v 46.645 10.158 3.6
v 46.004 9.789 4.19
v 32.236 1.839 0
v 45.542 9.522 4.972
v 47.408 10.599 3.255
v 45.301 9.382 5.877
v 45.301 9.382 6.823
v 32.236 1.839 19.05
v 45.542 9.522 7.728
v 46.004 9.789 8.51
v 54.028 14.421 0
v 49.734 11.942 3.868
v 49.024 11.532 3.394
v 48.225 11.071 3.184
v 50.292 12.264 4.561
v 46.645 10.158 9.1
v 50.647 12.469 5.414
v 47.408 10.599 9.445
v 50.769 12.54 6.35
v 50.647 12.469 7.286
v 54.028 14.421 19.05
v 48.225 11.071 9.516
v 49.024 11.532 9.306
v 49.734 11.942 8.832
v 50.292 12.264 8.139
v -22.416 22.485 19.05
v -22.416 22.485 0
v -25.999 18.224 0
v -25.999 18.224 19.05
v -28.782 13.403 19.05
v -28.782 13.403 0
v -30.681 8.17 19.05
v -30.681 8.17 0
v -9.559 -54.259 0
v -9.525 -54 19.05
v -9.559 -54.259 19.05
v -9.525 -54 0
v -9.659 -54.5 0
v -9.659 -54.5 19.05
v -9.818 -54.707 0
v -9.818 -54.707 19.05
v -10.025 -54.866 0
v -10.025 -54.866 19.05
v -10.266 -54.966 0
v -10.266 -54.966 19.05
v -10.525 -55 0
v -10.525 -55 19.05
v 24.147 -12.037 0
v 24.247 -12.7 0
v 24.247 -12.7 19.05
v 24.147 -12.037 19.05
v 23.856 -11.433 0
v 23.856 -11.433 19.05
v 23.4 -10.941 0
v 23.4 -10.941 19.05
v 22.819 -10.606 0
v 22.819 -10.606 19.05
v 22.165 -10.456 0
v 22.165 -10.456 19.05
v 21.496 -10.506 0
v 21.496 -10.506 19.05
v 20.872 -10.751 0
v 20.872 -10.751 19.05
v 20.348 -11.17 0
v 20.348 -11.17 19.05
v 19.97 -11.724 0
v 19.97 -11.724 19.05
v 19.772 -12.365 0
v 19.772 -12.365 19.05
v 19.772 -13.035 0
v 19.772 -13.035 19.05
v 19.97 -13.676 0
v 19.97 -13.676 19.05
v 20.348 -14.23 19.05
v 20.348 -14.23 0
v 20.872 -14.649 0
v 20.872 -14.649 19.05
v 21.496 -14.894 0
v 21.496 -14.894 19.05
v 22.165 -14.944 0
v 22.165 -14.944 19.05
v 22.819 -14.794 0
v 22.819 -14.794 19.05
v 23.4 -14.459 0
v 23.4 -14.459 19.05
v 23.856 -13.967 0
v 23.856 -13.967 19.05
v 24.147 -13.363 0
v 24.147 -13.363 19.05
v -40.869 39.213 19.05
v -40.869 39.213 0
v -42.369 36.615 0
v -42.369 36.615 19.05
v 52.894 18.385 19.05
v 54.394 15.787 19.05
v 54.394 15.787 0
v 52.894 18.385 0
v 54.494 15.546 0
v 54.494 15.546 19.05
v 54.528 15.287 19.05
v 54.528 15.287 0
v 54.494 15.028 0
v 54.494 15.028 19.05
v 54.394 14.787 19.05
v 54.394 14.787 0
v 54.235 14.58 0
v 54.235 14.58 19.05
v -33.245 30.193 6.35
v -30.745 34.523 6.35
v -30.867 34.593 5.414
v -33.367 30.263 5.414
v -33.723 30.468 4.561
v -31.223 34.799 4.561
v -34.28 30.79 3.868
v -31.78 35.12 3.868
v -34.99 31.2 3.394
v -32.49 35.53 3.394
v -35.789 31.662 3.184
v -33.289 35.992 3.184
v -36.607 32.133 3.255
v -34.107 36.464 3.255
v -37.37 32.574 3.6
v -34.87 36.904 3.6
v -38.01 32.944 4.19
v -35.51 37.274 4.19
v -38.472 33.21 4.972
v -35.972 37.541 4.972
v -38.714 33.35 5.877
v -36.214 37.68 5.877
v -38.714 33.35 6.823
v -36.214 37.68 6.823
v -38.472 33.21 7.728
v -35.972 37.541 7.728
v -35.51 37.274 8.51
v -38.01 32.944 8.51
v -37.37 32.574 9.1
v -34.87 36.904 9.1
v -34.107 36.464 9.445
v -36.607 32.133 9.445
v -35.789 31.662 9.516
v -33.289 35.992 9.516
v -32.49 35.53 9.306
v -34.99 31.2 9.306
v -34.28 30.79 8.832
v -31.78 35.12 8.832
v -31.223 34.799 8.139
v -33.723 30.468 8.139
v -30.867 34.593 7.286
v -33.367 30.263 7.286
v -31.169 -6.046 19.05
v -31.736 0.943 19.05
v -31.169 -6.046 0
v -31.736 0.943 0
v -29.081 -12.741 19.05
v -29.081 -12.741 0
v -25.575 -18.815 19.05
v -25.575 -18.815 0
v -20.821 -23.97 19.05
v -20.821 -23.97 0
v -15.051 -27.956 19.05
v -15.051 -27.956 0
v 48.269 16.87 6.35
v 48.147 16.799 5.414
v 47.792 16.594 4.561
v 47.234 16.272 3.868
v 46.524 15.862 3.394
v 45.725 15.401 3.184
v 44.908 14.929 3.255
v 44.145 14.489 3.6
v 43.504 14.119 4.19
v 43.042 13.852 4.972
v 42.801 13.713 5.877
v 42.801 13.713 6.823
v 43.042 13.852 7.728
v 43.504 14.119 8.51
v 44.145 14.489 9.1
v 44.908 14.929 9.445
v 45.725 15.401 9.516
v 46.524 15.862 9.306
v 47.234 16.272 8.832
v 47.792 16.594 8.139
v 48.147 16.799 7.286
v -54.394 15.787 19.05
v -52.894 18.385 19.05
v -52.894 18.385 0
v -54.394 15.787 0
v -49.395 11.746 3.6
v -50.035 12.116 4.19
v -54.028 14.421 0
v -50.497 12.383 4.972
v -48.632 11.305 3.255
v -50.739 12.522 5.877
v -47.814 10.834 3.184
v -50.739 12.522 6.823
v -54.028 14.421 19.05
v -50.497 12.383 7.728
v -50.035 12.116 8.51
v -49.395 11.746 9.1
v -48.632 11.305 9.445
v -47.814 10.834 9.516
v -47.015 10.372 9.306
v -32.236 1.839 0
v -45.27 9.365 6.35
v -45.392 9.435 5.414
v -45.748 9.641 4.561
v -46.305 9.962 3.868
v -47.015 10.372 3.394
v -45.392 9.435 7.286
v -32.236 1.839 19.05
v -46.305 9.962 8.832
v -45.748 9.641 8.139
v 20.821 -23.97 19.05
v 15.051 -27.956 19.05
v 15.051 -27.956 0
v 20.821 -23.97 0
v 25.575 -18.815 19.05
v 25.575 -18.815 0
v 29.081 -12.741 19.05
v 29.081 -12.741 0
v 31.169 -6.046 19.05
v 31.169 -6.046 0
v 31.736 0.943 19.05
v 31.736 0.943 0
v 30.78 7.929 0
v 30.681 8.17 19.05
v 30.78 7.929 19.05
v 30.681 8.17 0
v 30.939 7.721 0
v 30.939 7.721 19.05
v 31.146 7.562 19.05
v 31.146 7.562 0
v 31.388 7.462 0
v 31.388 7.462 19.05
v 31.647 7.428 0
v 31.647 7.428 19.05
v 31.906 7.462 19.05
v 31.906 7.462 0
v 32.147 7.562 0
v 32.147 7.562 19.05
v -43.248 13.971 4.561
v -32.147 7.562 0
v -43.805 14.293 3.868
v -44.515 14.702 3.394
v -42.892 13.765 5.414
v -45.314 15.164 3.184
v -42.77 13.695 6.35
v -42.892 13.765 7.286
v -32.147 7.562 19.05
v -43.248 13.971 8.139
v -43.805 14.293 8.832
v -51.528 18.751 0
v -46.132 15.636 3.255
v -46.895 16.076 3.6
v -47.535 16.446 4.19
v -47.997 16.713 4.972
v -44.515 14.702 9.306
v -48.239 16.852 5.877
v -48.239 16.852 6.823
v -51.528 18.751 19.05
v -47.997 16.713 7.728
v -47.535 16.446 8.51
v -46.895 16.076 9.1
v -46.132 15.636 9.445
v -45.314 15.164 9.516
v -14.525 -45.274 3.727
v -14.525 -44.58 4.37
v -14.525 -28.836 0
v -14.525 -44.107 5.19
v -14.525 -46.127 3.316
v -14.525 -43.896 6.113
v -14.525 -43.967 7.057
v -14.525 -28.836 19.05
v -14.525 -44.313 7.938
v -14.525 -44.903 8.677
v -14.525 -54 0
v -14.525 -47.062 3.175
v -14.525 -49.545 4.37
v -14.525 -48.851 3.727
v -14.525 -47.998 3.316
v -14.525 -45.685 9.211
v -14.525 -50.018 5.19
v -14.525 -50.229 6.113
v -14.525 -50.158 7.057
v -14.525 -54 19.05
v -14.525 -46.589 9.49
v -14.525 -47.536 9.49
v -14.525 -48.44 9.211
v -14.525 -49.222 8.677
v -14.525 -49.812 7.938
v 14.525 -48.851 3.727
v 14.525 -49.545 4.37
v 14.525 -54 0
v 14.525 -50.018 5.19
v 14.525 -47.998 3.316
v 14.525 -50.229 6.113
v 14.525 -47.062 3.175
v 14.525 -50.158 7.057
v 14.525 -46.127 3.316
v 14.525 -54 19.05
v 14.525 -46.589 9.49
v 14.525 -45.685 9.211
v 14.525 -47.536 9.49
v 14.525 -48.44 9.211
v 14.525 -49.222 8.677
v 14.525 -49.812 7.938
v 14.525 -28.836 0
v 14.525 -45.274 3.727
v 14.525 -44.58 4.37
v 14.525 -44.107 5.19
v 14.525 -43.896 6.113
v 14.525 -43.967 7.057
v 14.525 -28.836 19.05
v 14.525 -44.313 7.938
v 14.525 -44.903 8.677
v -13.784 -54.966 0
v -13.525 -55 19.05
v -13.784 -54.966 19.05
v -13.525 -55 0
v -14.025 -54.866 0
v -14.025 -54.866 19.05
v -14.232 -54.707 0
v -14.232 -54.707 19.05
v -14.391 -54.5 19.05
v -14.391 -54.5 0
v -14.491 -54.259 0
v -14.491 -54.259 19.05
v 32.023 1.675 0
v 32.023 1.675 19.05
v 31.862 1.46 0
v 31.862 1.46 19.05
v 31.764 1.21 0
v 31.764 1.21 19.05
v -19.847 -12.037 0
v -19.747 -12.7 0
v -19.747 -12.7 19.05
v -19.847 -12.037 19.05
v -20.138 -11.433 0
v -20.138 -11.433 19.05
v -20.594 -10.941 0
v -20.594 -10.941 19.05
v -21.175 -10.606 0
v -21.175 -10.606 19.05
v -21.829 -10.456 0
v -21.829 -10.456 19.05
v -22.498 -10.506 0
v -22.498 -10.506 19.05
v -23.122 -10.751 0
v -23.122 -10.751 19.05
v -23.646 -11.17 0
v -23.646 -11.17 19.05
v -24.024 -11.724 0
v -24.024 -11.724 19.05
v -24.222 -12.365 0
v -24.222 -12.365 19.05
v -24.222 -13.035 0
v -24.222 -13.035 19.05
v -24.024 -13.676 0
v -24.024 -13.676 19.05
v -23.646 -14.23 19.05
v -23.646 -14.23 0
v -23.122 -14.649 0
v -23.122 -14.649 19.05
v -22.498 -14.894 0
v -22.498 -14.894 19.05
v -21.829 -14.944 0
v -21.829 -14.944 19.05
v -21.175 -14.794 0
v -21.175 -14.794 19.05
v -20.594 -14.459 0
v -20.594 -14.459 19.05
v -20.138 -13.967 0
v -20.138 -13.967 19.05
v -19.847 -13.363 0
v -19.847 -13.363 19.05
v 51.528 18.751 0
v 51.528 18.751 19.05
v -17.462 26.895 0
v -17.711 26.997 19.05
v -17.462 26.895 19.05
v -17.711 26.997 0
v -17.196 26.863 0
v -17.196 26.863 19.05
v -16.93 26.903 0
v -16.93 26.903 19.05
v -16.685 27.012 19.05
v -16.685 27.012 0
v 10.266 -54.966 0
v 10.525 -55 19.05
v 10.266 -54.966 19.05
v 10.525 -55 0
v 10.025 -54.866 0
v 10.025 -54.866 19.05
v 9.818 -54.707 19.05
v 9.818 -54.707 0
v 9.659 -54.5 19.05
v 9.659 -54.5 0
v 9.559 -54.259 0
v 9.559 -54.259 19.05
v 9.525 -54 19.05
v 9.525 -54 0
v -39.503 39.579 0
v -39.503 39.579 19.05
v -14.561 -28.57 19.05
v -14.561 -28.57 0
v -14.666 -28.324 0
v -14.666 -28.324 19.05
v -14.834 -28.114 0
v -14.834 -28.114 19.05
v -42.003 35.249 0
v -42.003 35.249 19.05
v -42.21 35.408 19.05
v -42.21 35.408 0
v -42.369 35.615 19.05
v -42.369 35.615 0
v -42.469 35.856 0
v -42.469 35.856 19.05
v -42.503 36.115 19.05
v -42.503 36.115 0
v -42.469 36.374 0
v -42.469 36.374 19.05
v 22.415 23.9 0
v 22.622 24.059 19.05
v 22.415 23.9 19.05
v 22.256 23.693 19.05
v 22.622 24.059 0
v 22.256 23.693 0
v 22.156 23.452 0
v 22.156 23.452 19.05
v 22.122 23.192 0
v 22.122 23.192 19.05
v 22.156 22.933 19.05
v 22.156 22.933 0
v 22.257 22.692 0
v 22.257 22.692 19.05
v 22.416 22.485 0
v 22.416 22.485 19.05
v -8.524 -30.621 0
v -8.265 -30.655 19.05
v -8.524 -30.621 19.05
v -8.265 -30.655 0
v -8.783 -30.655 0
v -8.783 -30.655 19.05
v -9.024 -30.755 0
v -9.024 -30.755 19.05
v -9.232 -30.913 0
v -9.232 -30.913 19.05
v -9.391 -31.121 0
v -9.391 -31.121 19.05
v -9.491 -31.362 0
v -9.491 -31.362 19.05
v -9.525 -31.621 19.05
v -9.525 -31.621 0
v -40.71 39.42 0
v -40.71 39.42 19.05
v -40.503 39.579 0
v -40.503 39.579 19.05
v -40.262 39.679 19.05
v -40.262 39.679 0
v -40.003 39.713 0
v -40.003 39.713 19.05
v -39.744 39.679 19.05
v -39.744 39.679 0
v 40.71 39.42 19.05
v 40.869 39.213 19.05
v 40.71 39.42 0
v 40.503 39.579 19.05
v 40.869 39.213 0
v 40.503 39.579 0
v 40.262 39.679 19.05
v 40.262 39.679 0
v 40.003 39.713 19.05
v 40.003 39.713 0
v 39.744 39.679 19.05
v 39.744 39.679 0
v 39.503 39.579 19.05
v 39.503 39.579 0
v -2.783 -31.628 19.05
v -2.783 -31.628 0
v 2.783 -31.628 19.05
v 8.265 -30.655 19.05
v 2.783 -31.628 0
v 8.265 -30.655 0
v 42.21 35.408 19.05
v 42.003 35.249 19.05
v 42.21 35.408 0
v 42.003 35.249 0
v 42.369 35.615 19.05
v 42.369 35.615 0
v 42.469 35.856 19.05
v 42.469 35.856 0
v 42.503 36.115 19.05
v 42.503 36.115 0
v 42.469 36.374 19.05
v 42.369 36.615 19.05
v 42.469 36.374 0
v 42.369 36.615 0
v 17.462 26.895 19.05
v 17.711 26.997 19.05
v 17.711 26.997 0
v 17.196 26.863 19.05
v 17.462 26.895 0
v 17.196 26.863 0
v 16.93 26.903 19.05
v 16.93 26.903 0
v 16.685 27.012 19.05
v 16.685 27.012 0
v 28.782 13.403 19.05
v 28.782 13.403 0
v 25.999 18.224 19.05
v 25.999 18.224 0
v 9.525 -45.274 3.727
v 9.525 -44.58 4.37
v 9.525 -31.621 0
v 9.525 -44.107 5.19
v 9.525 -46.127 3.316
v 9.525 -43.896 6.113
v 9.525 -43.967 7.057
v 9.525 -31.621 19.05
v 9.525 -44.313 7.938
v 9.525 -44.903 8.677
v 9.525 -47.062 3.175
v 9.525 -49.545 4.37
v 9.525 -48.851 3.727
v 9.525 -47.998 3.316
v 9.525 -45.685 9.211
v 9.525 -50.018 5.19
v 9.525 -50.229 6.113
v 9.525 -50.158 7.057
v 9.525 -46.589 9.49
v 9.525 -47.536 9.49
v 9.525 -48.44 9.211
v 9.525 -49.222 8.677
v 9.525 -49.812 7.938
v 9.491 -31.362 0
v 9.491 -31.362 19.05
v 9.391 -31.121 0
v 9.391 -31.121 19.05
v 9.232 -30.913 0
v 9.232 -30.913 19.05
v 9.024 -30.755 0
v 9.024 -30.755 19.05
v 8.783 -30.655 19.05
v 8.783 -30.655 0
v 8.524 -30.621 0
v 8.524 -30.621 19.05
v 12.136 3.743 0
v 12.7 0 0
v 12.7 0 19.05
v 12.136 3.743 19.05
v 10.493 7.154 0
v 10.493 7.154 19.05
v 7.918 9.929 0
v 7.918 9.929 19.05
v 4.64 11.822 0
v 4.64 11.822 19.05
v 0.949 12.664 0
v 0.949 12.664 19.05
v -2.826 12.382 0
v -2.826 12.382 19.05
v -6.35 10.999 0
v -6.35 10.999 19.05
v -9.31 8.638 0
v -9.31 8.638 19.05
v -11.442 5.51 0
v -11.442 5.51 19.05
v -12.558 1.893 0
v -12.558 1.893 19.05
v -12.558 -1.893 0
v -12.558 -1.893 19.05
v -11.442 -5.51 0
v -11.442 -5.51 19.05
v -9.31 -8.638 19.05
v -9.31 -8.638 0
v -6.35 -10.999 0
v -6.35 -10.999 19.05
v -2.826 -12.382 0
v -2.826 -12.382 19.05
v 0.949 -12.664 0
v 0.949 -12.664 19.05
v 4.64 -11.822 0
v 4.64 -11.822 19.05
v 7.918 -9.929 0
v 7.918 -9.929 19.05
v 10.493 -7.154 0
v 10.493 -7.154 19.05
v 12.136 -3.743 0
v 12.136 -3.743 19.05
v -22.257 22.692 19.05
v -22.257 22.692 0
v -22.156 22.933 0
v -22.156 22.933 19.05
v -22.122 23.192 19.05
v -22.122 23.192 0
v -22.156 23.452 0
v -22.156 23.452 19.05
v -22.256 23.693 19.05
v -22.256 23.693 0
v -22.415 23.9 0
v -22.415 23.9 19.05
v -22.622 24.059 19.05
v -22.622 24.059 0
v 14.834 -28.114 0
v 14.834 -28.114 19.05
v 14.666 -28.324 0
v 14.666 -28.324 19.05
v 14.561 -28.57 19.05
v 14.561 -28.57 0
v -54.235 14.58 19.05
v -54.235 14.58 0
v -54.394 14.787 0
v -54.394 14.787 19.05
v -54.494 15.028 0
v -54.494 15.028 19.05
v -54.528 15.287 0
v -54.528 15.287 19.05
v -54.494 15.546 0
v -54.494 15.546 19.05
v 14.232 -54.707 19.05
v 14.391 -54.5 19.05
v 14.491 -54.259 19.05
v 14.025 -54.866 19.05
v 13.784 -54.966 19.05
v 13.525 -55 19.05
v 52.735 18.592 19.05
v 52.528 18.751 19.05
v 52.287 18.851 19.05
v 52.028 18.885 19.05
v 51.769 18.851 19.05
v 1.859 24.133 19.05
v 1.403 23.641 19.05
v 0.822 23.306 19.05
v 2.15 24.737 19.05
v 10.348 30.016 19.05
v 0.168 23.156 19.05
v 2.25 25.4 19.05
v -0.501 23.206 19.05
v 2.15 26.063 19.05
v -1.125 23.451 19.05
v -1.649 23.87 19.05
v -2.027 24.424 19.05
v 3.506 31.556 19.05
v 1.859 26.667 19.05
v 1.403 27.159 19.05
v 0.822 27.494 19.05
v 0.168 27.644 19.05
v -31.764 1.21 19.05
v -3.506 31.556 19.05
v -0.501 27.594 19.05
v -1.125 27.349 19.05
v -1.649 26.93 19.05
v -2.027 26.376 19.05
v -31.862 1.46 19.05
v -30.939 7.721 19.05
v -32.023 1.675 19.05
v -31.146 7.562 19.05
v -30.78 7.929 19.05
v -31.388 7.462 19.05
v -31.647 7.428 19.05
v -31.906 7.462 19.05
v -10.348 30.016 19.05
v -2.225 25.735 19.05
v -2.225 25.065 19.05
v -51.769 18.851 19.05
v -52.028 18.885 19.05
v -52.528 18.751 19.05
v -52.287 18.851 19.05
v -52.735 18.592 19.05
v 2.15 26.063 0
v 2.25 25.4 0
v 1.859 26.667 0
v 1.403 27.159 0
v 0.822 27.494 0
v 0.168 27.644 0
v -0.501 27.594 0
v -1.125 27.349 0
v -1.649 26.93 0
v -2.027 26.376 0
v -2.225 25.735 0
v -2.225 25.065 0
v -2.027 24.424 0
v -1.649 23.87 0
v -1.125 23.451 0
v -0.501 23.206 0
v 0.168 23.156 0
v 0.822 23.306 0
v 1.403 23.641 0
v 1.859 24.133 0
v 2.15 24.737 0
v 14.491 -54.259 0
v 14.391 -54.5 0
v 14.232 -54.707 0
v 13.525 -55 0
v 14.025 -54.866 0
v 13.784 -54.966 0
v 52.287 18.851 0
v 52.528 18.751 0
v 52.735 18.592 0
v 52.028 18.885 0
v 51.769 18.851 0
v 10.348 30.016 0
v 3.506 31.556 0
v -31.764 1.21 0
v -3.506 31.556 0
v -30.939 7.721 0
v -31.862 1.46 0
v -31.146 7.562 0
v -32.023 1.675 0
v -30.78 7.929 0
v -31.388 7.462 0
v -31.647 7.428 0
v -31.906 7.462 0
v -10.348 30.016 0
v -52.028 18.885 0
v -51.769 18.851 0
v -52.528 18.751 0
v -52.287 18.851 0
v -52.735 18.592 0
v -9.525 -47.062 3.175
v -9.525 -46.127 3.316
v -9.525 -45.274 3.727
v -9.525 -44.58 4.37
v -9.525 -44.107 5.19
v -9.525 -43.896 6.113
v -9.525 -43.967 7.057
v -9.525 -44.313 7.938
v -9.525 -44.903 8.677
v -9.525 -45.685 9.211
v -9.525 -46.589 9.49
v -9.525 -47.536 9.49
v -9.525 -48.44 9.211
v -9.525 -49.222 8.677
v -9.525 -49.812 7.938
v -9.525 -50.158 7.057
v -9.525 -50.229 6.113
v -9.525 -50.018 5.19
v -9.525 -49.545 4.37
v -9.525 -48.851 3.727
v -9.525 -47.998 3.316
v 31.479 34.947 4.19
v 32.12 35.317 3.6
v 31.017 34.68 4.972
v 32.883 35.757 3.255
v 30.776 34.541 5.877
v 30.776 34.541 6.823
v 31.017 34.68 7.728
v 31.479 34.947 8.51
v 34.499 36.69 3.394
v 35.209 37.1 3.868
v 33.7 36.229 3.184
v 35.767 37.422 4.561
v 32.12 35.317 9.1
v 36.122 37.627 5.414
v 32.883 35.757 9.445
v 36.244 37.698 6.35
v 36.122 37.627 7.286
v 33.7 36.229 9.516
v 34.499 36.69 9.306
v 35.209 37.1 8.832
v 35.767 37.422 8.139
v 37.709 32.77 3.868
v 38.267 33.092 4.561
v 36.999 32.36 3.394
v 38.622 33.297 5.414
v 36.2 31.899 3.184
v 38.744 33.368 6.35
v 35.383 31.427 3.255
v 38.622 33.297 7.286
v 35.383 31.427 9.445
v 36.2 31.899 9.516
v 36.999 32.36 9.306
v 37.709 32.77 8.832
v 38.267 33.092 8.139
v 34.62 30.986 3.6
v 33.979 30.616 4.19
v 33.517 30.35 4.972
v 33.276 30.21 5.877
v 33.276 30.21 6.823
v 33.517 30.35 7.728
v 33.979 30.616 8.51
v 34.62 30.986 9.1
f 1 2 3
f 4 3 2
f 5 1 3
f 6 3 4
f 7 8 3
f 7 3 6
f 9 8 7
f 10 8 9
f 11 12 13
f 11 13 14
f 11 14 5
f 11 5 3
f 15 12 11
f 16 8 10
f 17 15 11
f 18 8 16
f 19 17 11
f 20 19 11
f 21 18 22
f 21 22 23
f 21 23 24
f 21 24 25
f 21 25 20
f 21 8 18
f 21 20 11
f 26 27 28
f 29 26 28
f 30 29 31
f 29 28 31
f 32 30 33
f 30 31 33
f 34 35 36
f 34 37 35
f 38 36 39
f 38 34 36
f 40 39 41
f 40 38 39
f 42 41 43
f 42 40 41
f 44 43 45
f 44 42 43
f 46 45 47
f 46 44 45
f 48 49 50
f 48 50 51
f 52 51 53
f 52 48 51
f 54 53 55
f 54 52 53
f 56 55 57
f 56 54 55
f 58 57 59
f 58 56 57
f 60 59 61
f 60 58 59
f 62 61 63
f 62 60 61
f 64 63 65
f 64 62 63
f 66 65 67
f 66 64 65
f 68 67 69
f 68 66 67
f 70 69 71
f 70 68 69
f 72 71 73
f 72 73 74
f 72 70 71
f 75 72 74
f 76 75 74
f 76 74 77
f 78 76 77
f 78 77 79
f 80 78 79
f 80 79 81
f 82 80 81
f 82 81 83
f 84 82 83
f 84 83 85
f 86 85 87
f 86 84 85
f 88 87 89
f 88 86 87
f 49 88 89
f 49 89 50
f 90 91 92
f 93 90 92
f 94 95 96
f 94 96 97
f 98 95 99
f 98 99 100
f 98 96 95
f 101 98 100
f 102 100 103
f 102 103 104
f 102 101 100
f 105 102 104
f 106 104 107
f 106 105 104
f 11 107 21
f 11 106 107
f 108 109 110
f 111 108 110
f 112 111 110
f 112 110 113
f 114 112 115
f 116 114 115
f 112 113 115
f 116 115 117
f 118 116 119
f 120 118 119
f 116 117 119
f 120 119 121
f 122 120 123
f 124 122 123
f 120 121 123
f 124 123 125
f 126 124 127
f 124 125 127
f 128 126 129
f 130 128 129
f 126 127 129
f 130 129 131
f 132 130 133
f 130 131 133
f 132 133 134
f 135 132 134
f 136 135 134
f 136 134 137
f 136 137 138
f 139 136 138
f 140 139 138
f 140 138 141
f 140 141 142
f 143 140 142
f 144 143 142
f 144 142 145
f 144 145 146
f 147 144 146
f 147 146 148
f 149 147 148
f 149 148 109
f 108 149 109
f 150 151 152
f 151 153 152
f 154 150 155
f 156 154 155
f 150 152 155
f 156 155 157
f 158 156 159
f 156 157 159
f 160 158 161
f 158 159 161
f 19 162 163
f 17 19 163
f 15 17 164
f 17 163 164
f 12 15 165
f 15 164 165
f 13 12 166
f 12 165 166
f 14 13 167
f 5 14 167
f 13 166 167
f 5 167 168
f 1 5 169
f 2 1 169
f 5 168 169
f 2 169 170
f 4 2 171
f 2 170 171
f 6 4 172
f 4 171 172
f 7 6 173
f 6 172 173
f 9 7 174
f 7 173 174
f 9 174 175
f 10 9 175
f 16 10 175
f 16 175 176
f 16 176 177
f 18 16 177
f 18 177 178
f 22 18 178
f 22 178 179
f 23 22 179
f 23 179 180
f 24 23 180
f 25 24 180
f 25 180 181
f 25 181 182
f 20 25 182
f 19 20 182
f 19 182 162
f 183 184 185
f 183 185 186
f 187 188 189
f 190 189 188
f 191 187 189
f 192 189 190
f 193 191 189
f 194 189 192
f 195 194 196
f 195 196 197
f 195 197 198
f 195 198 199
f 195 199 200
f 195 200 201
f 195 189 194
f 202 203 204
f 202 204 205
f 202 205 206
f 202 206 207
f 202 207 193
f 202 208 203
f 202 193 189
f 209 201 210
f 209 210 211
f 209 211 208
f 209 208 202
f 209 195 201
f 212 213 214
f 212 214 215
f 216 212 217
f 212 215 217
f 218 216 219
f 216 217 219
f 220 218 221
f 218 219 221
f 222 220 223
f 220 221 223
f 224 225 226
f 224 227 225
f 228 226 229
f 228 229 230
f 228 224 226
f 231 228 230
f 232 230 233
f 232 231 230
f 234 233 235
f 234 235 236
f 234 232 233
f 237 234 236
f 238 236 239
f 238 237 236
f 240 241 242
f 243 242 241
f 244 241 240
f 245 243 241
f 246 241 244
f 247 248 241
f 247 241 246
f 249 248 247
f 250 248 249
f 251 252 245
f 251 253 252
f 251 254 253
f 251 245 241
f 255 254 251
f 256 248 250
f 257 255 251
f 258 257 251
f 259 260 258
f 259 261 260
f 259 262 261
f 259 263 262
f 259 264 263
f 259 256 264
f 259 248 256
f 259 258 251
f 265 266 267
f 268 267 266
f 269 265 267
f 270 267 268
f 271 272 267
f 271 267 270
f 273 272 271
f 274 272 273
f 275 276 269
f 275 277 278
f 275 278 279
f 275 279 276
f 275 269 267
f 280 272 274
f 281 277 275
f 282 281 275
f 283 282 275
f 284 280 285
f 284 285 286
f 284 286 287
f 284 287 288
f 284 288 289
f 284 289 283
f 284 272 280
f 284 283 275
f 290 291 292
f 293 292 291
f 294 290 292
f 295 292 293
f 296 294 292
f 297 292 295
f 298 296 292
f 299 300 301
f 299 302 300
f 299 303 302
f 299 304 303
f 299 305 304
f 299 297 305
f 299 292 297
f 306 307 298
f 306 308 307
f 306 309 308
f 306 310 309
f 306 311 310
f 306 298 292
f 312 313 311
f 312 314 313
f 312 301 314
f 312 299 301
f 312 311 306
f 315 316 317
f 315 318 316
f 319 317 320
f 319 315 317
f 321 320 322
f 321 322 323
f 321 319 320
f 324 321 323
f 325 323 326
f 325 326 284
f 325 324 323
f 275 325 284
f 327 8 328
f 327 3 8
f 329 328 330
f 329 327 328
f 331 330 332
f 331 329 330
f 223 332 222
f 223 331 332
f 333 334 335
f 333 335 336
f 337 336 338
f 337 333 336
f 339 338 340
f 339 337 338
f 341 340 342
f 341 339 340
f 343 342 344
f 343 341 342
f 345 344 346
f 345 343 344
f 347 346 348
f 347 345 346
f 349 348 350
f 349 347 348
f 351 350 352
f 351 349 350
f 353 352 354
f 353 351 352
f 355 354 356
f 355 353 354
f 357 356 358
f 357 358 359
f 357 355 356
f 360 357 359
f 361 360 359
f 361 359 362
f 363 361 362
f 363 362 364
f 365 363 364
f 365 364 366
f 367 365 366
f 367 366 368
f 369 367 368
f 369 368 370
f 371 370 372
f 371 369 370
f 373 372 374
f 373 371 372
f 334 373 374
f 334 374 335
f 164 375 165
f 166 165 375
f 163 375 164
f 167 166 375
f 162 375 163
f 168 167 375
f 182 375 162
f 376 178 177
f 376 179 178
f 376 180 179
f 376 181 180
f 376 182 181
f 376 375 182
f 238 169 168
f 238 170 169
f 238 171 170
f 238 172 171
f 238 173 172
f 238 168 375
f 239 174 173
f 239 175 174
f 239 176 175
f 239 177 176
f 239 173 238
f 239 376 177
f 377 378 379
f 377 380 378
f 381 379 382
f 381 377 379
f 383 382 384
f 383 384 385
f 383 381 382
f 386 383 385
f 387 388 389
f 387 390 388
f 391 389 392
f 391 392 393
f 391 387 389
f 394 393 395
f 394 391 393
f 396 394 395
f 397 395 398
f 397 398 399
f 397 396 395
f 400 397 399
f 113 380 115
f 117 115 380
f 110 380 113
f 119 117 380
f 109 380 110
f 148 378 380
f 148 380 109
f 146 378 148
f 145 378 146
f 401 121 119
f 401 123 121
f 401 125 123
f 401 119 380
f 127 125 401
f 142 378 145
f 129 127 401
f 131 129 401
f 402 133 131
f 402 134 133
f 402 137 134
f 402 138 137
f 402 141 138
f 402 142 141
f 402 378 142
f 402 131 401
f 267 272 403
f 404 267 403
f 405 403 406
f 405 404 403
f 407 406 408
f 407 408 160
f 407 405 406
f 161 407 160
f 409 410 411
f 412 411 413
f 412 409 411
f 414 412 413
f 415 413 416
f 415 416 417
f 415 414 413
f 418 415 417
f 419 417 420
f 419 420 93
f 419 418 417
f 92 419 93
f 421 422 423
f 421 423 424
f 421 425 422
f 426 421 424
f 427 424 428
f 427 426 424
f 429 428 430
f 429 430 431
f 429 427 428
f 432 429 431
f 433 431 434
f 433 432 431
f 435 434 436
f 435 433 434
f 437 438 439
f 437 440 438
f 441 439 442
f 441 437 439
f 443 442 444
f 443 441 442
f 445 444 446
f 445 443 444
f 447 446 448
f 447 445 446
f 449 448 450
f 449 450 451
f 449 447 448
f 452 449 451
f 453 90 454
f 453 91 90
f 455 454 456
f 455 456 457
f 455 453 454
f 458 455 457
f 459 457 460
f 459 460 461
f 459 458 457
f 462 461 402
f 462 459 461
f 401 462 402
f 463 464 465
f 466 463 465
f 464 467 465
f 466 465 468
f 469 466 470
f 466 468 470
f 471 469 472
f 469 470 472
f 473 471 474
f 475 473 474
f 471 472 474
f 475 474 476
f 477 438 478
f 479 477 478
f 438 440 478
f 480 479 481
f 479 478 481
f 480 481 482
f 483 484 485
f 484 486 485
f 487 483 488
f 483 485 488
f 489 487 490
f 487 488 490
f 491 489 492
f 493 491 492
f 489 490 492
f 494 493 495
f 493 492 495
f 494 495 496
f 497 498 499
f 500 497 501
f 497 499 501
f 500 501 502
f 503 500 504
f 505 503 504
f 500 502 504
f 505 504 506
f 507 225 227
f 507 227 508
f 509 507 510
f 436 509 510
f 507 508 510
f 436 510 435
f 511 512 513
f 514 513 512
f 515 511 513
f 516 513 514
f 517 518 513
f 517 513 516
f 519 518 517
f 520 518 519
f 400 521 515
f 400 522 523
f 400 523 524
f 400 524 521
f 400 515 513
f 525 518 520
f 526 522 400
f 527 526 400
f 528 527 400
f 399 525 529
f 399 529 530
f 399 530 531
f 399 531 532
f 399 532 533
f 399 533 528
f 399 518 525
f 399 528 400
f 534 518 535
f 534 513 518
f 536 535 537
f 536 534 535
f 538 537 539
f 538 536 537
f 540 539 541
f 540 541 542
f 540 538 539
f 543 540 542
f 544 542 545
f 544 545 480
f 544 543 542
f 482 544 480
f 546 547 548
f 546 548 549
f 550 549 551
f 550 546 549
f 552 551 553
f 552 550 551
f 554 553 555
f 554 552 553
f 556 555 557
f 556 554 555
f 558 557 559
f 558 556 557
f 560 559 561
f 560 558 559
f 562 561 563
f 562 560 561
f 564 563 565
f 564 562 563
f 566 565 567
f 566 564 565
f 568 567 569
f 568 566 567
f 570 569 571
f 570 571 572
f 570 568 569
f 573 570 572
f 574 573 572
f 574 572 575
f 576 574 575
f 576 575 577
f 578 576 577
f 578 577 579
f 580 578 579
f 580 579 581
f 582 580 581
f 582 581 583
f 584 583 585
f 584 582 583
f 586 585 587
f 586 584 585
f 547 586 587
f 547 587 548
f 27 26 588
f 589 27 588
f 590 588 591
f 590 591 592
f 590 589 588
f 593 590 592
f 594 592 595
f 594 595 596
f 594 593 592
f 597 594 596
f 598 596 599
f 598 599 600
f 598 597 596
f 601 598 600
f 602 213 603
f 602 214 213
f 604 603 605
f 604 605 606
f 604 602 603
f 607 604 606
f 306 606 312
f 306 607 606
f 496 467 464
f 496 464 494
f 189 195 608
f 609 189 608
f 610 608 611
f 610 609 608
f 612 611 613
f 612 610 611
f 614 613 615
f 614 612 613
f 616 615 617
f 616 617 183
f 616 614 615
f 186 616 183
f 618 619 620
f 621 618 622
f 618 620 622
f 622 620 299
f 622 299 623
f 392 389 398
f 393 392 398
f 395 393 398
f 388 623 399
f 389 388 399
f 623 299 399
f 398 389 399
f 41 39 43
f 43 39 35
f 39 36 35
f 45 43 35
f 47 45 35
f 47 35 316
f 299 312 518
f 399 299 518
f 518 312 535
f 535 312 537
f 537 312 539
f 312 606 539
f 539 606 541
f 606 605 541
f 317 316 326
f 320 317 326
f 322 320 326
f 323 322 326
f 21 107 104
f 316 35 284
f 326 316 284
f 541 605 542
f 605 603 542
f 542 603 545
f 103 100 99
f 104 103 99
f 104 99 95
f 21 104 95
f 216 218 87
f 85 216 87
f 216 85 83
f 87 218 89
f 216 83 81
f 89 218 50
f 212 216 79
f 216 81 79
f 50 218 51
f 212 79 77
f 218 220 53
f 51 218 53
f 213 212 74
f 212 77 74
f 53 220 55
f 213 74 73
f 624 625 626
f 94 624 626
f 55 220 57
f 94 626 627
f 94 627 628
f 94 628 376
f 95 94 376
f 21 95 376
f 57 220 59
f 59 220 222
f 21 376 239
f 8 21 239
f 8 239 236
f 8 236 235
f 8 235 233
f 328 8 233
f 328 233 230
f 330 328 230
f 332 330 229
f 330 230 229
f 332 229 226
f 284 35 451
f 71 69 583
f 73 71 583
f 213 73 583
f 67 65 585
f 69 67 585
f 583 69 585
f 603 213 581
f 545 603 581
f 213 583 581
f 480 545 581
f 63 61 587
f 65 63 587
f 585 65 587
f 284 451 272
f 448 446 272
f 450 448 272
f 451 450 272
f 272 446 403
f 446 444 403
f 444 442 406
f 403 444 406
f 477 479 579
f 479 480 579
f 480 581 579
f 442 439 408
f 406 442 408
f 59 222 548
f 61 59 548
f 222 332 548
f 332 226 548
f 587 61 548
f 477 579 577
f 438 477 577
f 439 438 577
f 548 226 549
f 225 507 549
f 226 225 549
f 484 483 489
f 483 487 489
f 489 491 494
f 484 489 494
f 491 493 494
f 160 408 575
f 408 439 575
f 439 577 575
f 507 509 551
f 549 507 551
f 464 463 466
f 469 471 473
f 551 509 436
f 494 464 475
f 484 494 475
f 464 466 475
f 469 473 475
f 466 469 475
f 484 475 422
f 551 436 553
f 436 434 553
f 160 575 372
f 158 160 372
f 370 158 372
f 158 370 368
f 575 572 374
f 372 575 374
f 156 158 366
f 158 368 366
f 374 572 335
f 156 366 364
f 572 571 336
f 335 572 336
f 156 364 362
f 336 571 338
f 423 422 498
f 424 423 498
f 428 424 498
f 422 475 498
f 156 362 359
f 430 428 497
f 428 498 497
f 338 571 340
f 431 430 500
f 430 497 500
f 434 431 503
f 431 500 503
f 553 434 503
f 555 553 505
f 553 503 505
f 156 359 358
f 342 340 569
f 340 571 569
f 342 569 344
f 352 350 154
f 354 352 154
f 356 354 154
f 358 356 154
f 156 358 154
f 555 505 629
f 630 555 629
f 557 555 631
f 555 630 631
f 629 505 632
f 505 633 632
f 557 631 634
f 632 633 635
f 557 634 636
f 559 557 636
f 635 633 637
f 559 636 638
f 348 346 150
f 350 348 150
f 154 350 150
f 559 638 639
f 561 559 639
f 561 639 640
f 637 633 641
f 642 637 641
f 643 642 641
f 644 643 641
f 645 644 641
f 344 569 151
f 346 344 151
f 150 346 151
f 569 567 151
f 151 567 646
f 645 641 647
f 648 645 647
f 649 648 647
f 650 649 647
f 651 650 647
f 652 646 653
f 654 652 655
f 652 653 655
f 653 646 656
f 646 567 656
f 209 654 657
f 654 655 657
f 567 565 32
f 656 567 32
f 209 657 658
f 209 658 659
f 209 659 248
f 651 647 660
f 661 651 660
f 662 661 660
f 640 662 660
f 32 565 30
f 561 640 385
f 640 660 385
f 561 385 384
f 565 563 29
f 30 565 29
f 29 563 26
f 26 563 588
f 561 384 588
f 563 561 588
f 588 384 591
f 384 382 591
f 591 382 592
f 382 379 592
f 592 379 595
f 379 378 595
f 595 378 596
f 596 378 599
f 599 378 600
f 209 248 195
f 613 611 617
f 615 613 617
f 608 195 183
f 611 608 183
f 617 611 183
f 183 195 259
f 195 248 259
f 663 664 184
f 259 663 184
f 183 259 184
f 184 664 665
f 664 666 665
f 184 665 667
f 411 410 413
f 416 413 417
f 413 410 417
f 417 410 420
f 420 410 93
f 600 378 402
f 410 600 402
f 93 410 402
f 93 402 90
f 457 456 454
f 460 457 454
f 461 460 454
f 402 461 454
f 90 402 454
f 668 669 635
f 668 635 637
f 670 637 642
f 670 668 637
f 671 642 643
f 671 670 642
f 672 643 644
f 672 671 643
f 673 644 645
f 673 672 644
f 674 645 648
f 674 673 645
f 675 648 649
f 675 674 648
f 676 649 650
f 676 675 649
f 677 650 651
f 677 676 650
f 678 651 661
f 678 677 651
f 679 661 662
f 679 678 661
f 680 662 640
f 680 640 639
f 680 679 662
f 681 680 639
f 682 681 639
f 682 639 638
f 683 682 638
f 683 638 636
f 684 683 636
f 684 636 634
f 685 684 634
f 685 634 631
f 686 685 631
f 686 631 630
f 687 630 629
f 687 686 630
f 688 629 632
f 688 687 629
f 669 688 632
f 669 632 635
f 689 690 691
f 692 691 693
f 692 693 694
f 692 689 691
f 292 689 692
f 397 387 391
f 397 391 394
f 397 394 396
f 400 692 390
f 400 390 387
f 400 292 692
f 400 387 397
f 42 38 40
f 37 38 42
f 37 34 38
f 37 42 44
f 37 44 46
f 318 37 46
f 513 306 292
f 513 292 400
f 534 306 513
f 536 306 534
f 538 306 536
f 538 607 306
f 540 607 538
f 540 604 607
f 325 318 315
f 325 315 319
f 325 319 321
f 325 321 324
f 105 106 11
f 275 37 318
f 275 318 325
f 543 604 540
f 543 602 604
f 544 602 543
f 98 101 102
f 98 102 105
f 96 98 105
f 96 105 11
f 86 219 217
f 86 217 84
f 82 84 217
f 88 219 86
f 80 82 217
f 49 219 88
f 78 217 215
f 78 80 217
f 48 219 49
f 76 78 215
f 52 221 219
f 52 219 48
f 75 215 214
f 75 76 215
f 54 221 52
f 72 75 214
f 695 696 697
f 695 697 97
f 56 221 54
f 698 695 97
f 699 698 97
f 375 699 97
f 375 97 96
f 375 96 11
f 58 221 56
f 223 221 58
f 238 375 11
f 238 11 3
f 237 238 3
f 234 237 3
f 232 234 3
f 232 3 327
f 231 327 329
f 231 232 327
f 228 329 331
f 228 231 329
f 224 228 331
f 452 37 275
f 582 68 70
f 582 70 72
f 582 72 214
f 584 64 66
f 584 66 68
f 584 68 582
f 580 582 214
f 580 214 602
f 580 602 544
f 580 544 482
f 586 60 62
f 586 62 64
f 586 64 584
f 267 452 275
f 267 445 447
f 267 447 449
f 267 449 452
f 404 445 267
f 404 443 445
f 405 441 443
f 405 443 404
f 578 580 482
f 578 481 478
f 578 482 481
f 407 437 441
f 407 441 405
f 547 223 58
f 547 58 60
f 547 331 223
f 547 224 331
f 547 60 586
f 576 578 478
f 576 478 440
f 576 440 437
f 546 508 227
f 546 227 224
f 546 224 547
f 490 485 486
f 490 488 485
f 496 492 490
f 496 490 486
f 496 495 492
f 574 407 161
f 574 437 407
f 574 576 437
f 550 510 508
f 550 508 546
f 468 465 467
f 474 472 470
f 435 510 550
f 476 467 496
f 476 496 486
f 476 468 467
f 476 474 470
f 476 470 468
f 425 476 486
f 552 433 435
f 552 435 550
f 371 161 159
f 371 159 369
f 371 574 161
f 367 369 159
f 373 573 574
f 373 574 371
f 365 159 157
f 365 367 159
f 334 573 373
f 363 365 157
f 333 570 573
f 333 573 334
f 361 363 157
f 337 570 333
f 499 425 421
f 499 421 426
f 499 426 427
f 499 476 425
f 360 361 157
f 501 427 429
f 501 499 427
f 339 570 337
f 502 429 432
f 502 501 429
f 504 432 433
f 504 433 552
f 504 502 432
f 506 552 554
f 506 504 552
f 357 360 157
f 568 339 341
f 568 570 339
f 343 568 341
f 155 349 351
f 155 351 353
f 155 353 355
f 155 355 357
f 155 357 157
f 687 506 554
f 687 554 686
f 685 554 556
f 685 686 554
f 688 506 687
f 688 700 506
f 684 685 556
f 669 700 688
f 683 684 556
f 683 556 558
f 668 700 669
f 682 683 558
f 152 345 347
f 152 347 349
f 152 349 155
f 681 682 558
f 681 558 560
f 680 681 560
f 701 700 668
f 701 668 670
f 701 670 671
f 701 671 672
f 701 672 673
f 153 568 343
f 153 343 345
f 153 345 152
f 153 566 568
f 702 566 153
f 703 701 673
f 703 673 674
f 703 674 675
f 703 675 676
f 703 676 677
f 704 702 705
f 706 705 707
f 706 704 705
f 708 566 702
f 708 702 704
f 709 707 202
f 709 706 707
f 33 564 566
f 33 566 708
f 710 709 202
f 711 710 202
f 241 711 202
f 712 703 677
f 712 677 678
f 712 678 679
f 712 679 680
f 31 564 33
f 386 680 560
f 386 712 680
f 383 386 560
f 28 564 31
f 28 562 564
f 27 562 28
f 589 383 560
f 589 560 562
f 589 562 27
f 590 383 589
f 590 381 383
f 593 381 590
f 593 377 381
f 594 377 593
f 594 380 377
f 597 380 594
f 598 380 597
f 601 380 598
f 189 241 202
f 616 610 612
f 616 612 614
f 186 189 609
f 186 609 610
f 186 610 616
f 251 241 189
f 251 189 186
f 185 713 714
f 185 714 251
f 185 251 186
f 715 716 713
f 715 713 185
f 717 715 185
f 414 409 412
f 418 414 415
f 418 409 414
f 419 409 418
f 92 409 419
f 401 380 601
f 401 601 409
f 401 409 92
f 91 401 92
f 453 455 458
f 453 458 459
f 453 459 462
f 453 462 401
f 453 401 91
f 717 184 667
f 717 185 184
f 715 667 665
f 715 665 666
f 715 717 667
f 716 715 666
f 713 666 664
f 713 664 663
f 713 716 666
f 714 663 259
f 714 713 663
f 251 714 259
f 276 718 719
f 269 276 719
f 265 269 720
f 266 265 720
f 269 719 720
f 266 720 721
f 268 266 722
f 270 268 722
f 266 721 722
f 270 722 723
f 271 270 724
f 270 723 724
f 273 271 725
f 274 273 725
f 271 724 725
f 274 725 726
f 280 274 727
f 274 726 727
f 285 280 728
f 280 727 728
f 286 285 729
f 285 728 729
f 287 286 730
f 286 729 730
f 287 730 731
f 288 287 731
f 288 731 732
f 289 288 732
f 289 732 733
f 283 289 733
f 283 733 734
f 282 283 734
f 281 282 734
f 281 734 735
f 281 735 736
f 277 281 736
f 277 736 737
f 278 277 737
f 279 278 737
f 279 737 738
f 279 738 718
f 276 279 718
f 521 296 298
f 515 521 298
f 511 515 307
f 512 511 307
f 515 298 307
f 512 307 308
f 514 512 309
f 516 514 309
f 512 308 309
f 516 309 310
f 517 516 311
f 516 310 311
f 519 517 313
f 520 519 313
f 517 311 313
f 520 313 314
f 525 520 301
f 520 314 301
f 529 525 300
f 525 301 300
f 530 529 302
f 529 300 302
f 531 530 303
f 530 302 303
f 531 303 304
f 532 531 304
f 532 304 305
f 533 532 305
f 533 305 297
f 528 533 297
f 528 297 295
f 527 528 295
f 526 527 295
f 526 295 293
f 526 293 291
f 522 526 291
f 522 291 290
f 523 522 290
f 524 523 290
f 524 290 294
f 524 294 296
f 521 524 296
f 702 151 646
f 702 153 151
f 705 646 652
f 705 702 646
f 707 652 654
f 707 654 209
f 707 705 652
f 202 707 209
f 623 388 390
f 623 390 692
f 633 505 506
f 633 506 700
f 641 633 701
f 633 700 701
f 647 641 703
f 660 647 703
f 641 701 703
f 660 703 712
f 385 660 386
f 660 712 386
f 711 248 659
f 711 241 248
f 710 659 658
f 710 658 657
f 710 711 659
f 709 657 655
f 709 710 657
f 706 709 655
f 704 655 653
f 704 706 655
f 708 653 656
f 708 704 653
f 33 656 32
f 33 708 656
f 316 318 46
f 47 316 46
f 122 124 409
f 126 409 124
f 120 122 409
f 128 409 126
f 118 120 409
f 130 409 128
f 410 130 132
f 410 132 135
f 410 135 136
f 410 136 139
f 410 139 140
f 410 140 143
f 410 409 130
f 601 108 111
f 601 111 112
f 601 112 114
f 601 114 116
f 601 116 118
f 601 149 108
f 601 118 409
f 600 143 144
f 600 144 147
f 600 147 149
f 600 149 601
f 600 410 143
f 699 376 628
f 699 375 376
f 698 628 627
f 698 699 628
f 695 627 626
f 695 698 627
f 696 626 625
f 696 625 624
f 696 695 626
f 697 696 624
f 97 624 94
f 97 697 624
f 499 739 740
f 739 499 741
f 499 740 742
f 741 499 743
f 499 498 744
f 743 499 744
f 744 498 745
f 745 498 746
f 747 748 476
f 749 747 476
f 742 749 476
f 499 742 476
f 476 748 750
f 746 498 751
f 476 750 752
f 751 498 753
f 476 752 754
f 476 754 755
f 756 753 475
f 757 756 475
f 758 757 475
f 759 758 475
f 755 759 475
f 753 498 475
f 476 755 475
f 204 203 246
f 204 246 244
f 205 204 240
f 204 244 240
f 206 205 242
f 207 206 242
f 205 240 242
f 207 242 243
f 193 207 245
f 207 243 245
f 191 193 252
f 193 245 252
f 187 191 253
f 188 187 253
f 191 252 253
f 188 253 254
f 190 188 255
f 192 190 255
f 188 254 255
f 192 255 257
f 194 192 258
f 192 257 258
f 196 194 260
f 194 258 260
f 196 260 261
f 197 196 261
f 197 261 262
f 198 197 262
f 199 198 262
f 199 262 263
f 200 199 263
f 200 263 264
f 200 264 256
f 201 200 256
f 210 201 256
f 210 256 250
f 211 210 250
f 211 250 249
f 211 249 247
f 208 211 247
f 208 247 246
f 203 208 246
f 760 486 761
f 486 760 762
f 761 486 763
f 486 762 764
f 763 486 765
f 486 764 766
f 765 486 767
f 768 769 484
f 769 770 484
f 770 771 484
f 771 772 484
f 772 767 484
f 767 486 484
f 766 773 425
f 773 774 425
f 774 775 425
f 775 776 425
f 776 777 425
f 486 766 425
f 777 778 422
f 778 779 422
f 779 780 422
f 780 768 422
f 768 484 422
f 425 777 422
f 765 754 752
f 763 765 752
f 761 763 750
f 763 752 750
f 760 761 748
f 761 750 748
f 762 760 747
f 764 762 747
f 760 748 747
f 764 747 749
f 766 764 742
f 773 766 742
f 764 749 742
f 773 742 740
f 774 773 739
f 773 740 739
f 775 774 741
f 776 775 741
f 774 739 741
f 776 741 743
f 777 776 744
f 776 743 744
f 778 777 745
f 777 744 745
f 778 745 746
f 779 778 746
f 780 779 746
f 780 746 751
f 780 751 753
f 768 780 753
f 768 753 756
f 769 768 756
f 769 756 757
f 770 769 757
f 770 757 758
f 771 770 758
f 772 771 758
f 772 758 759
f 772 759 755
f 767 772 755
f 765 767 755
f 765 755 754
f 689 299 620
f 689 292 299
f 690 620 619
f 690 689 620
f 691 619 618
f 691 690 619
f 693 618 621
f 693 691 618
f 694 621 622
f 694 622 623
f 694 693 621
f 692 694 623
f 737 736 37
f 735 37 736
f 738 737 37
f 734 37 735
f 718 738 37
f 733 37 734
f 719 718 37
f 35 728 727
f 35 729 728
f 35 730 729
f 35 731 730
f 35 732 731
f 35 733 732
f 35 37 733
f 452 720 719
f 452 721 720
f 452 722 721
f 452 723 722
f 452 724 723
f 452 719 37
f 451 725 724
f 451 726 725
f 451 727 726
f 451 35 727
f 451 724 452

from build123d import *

# Parameters (mm, degrees)
ESQUISSE1_R             = 31.75
ESQUISSE1_R_2           = 12.7
ESQUISSE1_R_3           = 2.25
BOSS_EXTRU_1_DEPTH      = 19.05
BOSS_EXTRU_2_DEPTH      = 19.05
ESQUISSE3_R             = 3.175
ENL_V_MAT_EXTRU_1_DEPTH = 90.603345812
ESQUISSE4_R             = 3.175
ENL_V_MAT_EXTRU_2_DEPTH = 90.603345812
ESQUISSE5_R             = 3.175
ENL_V_MAT_EXTRU_3_DEPTH = 70.418897208
CONG_1_R                = 1


with BuildPart() as part:
    # Esquisse1 → Boss.-Extru.1 (new body)
    with BuildSketch(Plane.XY):
        Circle(ESQUISSE1_R)
        Circle(ESQUISSE1_R_2, mode=Mode.SUBTRACT)
        with Locations((0, 25.4)):
            Circle(ESQUISSE1_R_3, mode=Mode.SUBTRACT)
        with Locations((-21.997045256, -12.7)):
            Circle(ESQUISSE1_R_3, mode=Mode.SUBTRACT)
        with Locations((21.997045256, -12.7)):
            Circle(ESQUISSE1_R_3, mode=Mode.SUBTRACT)
    extrude(amount=BOSS_EXTRU_1_DEPTH)

    # Esquisse2 → Boss.-Extru.2 (add)
    with BuildSketch(Plane.XY.offset(19.05)):
        Polygon((42.868897208, 35.748891971), (21.467304731, 23.392676794), (17.187758818, 26.6953825), (40.368897208, 40.07901899), align=None)
        Polygon((30.992304731, 6.894892851), (31.712758818, 1.53734452), (54.893897208, 14.92098101), (52.393897208, 19.251108029), align=None)
        Polygon((14.525, -55), (14.525, -28.23272702), (9.525, -30.287569645), (9.525, -55), align=None)
        Polygon((-9.525, -30.287569645), (-14.525, -28.23272702), (-14.525, -55), (-9.525, -55), align=None)
        Polygon((-54.893897208, 14.92098101), (-31.712758818, 1.53734452), (-30.992304731, 6.894892851), (-52.393897208, 19.251108029), align=None)
        Polygon((-21.467304731, 23.392676794), (-17.187758818, 26.6953825), (-40.368897208, 40.07901899), (-42.868897208, 35.748891971), align=None)
    extrude(amount=-BOSS_EXTRU_2_DEPTH)

    # Esquisse3 → Enlèv. mat.-Extru.1 (cut, through all)
    with BuildSketch(Plane(origin=(7.2625, 12.57901899, 0), x_dir=(0.866025404, -0.5, 0), z_dir=(0.5, 0.866025404, 0))):
        with Locations((-47.0625, -6.35)):
            Circle(ESQUISSE3_R)
    extrude(amount=-ENL_V_MAT_EXTRU_1_DEPTH, mode=Mode.SUBTRACT)

    # Esquisse4 → Enlèv. mat.-Extru.2 (cut, through all)
    with BuildSketch(Plane(origin=(-7.2625, 12.57901899, 0), x_dir=(0.866025404, 0.5, 0), z_dir=(-0.5, 0.866025404, 0))):
        with Locations((47.0625, -6.35)):
            Circle(ESQUISSE4_R)
    extrude(amount=-ENL_V_MAT_EXTRU_2_DEPTH, mode=Mode.SUBTRACT)

    # Esquisse5 → Enlèv. mat.-Extru.3 (cut, through all)
    with BuildSketch(Plane(origin=(14.525, 0, 0), x_dir=(0, 0, -1), z_dir=(1, 0, 0))):
        with Locations((-6.35, -47.0625)):
            Circle(ESQUISSE5_R)
    extrude(amount=-ENL_V_MAT_EXTRU_3_DEPTH, mode=Mode.SUBTRACT)

    # Congé1
    cong_1_edges = [part.edges().sort_by_distance(p)[0] for p in [
        (40.368897208, 40.07901899, 9.525),
        (42.868897208, 35.748891971, 9.525),
        (21.467304731, 23.392676794, 9.525),
        (17.187758818, 26.6953825, 9.525),
        (30.992304731, 6.894892851, 9.525),
        (52.393897208, 19.251108029, 9.525),
        (54.893897208, 14.92098101, 9.525),
        (31.712758818, 1.53734452, 9.525),
        (14.525, -55, 9.525),
        (9.525, -55, 9.525),
        (9.525, -30.287569645, 9.525),
        (14.525, -28.23272702, 9.525),
        (-9.525, -30.287569645, 9.525),
        (-9.525, -55, 9.525),
        (-14.525, -55, 9.525),
        (-14.525, -28.23272702, 9.525),
        (-54.893897208, 14.92098101, 9.525),
        (-52.393897208, 19.251108029, 9.525),
        (-30.992304731, 6.894892851, 9.525),
        (-31.712758818, 1.53734452, 9.525),
        (-21.467304731, 23.392676794, 9.525),
        (-42.868897208, 35.748891971, 9.525),
        (-40.368897208, 40.07901899, 9.525),
        (-17.187758818, 26.6953825, 9.525),
    ]]
    fillet(cong_1_edges, radius=CONG_1_R)


solid = part.part
